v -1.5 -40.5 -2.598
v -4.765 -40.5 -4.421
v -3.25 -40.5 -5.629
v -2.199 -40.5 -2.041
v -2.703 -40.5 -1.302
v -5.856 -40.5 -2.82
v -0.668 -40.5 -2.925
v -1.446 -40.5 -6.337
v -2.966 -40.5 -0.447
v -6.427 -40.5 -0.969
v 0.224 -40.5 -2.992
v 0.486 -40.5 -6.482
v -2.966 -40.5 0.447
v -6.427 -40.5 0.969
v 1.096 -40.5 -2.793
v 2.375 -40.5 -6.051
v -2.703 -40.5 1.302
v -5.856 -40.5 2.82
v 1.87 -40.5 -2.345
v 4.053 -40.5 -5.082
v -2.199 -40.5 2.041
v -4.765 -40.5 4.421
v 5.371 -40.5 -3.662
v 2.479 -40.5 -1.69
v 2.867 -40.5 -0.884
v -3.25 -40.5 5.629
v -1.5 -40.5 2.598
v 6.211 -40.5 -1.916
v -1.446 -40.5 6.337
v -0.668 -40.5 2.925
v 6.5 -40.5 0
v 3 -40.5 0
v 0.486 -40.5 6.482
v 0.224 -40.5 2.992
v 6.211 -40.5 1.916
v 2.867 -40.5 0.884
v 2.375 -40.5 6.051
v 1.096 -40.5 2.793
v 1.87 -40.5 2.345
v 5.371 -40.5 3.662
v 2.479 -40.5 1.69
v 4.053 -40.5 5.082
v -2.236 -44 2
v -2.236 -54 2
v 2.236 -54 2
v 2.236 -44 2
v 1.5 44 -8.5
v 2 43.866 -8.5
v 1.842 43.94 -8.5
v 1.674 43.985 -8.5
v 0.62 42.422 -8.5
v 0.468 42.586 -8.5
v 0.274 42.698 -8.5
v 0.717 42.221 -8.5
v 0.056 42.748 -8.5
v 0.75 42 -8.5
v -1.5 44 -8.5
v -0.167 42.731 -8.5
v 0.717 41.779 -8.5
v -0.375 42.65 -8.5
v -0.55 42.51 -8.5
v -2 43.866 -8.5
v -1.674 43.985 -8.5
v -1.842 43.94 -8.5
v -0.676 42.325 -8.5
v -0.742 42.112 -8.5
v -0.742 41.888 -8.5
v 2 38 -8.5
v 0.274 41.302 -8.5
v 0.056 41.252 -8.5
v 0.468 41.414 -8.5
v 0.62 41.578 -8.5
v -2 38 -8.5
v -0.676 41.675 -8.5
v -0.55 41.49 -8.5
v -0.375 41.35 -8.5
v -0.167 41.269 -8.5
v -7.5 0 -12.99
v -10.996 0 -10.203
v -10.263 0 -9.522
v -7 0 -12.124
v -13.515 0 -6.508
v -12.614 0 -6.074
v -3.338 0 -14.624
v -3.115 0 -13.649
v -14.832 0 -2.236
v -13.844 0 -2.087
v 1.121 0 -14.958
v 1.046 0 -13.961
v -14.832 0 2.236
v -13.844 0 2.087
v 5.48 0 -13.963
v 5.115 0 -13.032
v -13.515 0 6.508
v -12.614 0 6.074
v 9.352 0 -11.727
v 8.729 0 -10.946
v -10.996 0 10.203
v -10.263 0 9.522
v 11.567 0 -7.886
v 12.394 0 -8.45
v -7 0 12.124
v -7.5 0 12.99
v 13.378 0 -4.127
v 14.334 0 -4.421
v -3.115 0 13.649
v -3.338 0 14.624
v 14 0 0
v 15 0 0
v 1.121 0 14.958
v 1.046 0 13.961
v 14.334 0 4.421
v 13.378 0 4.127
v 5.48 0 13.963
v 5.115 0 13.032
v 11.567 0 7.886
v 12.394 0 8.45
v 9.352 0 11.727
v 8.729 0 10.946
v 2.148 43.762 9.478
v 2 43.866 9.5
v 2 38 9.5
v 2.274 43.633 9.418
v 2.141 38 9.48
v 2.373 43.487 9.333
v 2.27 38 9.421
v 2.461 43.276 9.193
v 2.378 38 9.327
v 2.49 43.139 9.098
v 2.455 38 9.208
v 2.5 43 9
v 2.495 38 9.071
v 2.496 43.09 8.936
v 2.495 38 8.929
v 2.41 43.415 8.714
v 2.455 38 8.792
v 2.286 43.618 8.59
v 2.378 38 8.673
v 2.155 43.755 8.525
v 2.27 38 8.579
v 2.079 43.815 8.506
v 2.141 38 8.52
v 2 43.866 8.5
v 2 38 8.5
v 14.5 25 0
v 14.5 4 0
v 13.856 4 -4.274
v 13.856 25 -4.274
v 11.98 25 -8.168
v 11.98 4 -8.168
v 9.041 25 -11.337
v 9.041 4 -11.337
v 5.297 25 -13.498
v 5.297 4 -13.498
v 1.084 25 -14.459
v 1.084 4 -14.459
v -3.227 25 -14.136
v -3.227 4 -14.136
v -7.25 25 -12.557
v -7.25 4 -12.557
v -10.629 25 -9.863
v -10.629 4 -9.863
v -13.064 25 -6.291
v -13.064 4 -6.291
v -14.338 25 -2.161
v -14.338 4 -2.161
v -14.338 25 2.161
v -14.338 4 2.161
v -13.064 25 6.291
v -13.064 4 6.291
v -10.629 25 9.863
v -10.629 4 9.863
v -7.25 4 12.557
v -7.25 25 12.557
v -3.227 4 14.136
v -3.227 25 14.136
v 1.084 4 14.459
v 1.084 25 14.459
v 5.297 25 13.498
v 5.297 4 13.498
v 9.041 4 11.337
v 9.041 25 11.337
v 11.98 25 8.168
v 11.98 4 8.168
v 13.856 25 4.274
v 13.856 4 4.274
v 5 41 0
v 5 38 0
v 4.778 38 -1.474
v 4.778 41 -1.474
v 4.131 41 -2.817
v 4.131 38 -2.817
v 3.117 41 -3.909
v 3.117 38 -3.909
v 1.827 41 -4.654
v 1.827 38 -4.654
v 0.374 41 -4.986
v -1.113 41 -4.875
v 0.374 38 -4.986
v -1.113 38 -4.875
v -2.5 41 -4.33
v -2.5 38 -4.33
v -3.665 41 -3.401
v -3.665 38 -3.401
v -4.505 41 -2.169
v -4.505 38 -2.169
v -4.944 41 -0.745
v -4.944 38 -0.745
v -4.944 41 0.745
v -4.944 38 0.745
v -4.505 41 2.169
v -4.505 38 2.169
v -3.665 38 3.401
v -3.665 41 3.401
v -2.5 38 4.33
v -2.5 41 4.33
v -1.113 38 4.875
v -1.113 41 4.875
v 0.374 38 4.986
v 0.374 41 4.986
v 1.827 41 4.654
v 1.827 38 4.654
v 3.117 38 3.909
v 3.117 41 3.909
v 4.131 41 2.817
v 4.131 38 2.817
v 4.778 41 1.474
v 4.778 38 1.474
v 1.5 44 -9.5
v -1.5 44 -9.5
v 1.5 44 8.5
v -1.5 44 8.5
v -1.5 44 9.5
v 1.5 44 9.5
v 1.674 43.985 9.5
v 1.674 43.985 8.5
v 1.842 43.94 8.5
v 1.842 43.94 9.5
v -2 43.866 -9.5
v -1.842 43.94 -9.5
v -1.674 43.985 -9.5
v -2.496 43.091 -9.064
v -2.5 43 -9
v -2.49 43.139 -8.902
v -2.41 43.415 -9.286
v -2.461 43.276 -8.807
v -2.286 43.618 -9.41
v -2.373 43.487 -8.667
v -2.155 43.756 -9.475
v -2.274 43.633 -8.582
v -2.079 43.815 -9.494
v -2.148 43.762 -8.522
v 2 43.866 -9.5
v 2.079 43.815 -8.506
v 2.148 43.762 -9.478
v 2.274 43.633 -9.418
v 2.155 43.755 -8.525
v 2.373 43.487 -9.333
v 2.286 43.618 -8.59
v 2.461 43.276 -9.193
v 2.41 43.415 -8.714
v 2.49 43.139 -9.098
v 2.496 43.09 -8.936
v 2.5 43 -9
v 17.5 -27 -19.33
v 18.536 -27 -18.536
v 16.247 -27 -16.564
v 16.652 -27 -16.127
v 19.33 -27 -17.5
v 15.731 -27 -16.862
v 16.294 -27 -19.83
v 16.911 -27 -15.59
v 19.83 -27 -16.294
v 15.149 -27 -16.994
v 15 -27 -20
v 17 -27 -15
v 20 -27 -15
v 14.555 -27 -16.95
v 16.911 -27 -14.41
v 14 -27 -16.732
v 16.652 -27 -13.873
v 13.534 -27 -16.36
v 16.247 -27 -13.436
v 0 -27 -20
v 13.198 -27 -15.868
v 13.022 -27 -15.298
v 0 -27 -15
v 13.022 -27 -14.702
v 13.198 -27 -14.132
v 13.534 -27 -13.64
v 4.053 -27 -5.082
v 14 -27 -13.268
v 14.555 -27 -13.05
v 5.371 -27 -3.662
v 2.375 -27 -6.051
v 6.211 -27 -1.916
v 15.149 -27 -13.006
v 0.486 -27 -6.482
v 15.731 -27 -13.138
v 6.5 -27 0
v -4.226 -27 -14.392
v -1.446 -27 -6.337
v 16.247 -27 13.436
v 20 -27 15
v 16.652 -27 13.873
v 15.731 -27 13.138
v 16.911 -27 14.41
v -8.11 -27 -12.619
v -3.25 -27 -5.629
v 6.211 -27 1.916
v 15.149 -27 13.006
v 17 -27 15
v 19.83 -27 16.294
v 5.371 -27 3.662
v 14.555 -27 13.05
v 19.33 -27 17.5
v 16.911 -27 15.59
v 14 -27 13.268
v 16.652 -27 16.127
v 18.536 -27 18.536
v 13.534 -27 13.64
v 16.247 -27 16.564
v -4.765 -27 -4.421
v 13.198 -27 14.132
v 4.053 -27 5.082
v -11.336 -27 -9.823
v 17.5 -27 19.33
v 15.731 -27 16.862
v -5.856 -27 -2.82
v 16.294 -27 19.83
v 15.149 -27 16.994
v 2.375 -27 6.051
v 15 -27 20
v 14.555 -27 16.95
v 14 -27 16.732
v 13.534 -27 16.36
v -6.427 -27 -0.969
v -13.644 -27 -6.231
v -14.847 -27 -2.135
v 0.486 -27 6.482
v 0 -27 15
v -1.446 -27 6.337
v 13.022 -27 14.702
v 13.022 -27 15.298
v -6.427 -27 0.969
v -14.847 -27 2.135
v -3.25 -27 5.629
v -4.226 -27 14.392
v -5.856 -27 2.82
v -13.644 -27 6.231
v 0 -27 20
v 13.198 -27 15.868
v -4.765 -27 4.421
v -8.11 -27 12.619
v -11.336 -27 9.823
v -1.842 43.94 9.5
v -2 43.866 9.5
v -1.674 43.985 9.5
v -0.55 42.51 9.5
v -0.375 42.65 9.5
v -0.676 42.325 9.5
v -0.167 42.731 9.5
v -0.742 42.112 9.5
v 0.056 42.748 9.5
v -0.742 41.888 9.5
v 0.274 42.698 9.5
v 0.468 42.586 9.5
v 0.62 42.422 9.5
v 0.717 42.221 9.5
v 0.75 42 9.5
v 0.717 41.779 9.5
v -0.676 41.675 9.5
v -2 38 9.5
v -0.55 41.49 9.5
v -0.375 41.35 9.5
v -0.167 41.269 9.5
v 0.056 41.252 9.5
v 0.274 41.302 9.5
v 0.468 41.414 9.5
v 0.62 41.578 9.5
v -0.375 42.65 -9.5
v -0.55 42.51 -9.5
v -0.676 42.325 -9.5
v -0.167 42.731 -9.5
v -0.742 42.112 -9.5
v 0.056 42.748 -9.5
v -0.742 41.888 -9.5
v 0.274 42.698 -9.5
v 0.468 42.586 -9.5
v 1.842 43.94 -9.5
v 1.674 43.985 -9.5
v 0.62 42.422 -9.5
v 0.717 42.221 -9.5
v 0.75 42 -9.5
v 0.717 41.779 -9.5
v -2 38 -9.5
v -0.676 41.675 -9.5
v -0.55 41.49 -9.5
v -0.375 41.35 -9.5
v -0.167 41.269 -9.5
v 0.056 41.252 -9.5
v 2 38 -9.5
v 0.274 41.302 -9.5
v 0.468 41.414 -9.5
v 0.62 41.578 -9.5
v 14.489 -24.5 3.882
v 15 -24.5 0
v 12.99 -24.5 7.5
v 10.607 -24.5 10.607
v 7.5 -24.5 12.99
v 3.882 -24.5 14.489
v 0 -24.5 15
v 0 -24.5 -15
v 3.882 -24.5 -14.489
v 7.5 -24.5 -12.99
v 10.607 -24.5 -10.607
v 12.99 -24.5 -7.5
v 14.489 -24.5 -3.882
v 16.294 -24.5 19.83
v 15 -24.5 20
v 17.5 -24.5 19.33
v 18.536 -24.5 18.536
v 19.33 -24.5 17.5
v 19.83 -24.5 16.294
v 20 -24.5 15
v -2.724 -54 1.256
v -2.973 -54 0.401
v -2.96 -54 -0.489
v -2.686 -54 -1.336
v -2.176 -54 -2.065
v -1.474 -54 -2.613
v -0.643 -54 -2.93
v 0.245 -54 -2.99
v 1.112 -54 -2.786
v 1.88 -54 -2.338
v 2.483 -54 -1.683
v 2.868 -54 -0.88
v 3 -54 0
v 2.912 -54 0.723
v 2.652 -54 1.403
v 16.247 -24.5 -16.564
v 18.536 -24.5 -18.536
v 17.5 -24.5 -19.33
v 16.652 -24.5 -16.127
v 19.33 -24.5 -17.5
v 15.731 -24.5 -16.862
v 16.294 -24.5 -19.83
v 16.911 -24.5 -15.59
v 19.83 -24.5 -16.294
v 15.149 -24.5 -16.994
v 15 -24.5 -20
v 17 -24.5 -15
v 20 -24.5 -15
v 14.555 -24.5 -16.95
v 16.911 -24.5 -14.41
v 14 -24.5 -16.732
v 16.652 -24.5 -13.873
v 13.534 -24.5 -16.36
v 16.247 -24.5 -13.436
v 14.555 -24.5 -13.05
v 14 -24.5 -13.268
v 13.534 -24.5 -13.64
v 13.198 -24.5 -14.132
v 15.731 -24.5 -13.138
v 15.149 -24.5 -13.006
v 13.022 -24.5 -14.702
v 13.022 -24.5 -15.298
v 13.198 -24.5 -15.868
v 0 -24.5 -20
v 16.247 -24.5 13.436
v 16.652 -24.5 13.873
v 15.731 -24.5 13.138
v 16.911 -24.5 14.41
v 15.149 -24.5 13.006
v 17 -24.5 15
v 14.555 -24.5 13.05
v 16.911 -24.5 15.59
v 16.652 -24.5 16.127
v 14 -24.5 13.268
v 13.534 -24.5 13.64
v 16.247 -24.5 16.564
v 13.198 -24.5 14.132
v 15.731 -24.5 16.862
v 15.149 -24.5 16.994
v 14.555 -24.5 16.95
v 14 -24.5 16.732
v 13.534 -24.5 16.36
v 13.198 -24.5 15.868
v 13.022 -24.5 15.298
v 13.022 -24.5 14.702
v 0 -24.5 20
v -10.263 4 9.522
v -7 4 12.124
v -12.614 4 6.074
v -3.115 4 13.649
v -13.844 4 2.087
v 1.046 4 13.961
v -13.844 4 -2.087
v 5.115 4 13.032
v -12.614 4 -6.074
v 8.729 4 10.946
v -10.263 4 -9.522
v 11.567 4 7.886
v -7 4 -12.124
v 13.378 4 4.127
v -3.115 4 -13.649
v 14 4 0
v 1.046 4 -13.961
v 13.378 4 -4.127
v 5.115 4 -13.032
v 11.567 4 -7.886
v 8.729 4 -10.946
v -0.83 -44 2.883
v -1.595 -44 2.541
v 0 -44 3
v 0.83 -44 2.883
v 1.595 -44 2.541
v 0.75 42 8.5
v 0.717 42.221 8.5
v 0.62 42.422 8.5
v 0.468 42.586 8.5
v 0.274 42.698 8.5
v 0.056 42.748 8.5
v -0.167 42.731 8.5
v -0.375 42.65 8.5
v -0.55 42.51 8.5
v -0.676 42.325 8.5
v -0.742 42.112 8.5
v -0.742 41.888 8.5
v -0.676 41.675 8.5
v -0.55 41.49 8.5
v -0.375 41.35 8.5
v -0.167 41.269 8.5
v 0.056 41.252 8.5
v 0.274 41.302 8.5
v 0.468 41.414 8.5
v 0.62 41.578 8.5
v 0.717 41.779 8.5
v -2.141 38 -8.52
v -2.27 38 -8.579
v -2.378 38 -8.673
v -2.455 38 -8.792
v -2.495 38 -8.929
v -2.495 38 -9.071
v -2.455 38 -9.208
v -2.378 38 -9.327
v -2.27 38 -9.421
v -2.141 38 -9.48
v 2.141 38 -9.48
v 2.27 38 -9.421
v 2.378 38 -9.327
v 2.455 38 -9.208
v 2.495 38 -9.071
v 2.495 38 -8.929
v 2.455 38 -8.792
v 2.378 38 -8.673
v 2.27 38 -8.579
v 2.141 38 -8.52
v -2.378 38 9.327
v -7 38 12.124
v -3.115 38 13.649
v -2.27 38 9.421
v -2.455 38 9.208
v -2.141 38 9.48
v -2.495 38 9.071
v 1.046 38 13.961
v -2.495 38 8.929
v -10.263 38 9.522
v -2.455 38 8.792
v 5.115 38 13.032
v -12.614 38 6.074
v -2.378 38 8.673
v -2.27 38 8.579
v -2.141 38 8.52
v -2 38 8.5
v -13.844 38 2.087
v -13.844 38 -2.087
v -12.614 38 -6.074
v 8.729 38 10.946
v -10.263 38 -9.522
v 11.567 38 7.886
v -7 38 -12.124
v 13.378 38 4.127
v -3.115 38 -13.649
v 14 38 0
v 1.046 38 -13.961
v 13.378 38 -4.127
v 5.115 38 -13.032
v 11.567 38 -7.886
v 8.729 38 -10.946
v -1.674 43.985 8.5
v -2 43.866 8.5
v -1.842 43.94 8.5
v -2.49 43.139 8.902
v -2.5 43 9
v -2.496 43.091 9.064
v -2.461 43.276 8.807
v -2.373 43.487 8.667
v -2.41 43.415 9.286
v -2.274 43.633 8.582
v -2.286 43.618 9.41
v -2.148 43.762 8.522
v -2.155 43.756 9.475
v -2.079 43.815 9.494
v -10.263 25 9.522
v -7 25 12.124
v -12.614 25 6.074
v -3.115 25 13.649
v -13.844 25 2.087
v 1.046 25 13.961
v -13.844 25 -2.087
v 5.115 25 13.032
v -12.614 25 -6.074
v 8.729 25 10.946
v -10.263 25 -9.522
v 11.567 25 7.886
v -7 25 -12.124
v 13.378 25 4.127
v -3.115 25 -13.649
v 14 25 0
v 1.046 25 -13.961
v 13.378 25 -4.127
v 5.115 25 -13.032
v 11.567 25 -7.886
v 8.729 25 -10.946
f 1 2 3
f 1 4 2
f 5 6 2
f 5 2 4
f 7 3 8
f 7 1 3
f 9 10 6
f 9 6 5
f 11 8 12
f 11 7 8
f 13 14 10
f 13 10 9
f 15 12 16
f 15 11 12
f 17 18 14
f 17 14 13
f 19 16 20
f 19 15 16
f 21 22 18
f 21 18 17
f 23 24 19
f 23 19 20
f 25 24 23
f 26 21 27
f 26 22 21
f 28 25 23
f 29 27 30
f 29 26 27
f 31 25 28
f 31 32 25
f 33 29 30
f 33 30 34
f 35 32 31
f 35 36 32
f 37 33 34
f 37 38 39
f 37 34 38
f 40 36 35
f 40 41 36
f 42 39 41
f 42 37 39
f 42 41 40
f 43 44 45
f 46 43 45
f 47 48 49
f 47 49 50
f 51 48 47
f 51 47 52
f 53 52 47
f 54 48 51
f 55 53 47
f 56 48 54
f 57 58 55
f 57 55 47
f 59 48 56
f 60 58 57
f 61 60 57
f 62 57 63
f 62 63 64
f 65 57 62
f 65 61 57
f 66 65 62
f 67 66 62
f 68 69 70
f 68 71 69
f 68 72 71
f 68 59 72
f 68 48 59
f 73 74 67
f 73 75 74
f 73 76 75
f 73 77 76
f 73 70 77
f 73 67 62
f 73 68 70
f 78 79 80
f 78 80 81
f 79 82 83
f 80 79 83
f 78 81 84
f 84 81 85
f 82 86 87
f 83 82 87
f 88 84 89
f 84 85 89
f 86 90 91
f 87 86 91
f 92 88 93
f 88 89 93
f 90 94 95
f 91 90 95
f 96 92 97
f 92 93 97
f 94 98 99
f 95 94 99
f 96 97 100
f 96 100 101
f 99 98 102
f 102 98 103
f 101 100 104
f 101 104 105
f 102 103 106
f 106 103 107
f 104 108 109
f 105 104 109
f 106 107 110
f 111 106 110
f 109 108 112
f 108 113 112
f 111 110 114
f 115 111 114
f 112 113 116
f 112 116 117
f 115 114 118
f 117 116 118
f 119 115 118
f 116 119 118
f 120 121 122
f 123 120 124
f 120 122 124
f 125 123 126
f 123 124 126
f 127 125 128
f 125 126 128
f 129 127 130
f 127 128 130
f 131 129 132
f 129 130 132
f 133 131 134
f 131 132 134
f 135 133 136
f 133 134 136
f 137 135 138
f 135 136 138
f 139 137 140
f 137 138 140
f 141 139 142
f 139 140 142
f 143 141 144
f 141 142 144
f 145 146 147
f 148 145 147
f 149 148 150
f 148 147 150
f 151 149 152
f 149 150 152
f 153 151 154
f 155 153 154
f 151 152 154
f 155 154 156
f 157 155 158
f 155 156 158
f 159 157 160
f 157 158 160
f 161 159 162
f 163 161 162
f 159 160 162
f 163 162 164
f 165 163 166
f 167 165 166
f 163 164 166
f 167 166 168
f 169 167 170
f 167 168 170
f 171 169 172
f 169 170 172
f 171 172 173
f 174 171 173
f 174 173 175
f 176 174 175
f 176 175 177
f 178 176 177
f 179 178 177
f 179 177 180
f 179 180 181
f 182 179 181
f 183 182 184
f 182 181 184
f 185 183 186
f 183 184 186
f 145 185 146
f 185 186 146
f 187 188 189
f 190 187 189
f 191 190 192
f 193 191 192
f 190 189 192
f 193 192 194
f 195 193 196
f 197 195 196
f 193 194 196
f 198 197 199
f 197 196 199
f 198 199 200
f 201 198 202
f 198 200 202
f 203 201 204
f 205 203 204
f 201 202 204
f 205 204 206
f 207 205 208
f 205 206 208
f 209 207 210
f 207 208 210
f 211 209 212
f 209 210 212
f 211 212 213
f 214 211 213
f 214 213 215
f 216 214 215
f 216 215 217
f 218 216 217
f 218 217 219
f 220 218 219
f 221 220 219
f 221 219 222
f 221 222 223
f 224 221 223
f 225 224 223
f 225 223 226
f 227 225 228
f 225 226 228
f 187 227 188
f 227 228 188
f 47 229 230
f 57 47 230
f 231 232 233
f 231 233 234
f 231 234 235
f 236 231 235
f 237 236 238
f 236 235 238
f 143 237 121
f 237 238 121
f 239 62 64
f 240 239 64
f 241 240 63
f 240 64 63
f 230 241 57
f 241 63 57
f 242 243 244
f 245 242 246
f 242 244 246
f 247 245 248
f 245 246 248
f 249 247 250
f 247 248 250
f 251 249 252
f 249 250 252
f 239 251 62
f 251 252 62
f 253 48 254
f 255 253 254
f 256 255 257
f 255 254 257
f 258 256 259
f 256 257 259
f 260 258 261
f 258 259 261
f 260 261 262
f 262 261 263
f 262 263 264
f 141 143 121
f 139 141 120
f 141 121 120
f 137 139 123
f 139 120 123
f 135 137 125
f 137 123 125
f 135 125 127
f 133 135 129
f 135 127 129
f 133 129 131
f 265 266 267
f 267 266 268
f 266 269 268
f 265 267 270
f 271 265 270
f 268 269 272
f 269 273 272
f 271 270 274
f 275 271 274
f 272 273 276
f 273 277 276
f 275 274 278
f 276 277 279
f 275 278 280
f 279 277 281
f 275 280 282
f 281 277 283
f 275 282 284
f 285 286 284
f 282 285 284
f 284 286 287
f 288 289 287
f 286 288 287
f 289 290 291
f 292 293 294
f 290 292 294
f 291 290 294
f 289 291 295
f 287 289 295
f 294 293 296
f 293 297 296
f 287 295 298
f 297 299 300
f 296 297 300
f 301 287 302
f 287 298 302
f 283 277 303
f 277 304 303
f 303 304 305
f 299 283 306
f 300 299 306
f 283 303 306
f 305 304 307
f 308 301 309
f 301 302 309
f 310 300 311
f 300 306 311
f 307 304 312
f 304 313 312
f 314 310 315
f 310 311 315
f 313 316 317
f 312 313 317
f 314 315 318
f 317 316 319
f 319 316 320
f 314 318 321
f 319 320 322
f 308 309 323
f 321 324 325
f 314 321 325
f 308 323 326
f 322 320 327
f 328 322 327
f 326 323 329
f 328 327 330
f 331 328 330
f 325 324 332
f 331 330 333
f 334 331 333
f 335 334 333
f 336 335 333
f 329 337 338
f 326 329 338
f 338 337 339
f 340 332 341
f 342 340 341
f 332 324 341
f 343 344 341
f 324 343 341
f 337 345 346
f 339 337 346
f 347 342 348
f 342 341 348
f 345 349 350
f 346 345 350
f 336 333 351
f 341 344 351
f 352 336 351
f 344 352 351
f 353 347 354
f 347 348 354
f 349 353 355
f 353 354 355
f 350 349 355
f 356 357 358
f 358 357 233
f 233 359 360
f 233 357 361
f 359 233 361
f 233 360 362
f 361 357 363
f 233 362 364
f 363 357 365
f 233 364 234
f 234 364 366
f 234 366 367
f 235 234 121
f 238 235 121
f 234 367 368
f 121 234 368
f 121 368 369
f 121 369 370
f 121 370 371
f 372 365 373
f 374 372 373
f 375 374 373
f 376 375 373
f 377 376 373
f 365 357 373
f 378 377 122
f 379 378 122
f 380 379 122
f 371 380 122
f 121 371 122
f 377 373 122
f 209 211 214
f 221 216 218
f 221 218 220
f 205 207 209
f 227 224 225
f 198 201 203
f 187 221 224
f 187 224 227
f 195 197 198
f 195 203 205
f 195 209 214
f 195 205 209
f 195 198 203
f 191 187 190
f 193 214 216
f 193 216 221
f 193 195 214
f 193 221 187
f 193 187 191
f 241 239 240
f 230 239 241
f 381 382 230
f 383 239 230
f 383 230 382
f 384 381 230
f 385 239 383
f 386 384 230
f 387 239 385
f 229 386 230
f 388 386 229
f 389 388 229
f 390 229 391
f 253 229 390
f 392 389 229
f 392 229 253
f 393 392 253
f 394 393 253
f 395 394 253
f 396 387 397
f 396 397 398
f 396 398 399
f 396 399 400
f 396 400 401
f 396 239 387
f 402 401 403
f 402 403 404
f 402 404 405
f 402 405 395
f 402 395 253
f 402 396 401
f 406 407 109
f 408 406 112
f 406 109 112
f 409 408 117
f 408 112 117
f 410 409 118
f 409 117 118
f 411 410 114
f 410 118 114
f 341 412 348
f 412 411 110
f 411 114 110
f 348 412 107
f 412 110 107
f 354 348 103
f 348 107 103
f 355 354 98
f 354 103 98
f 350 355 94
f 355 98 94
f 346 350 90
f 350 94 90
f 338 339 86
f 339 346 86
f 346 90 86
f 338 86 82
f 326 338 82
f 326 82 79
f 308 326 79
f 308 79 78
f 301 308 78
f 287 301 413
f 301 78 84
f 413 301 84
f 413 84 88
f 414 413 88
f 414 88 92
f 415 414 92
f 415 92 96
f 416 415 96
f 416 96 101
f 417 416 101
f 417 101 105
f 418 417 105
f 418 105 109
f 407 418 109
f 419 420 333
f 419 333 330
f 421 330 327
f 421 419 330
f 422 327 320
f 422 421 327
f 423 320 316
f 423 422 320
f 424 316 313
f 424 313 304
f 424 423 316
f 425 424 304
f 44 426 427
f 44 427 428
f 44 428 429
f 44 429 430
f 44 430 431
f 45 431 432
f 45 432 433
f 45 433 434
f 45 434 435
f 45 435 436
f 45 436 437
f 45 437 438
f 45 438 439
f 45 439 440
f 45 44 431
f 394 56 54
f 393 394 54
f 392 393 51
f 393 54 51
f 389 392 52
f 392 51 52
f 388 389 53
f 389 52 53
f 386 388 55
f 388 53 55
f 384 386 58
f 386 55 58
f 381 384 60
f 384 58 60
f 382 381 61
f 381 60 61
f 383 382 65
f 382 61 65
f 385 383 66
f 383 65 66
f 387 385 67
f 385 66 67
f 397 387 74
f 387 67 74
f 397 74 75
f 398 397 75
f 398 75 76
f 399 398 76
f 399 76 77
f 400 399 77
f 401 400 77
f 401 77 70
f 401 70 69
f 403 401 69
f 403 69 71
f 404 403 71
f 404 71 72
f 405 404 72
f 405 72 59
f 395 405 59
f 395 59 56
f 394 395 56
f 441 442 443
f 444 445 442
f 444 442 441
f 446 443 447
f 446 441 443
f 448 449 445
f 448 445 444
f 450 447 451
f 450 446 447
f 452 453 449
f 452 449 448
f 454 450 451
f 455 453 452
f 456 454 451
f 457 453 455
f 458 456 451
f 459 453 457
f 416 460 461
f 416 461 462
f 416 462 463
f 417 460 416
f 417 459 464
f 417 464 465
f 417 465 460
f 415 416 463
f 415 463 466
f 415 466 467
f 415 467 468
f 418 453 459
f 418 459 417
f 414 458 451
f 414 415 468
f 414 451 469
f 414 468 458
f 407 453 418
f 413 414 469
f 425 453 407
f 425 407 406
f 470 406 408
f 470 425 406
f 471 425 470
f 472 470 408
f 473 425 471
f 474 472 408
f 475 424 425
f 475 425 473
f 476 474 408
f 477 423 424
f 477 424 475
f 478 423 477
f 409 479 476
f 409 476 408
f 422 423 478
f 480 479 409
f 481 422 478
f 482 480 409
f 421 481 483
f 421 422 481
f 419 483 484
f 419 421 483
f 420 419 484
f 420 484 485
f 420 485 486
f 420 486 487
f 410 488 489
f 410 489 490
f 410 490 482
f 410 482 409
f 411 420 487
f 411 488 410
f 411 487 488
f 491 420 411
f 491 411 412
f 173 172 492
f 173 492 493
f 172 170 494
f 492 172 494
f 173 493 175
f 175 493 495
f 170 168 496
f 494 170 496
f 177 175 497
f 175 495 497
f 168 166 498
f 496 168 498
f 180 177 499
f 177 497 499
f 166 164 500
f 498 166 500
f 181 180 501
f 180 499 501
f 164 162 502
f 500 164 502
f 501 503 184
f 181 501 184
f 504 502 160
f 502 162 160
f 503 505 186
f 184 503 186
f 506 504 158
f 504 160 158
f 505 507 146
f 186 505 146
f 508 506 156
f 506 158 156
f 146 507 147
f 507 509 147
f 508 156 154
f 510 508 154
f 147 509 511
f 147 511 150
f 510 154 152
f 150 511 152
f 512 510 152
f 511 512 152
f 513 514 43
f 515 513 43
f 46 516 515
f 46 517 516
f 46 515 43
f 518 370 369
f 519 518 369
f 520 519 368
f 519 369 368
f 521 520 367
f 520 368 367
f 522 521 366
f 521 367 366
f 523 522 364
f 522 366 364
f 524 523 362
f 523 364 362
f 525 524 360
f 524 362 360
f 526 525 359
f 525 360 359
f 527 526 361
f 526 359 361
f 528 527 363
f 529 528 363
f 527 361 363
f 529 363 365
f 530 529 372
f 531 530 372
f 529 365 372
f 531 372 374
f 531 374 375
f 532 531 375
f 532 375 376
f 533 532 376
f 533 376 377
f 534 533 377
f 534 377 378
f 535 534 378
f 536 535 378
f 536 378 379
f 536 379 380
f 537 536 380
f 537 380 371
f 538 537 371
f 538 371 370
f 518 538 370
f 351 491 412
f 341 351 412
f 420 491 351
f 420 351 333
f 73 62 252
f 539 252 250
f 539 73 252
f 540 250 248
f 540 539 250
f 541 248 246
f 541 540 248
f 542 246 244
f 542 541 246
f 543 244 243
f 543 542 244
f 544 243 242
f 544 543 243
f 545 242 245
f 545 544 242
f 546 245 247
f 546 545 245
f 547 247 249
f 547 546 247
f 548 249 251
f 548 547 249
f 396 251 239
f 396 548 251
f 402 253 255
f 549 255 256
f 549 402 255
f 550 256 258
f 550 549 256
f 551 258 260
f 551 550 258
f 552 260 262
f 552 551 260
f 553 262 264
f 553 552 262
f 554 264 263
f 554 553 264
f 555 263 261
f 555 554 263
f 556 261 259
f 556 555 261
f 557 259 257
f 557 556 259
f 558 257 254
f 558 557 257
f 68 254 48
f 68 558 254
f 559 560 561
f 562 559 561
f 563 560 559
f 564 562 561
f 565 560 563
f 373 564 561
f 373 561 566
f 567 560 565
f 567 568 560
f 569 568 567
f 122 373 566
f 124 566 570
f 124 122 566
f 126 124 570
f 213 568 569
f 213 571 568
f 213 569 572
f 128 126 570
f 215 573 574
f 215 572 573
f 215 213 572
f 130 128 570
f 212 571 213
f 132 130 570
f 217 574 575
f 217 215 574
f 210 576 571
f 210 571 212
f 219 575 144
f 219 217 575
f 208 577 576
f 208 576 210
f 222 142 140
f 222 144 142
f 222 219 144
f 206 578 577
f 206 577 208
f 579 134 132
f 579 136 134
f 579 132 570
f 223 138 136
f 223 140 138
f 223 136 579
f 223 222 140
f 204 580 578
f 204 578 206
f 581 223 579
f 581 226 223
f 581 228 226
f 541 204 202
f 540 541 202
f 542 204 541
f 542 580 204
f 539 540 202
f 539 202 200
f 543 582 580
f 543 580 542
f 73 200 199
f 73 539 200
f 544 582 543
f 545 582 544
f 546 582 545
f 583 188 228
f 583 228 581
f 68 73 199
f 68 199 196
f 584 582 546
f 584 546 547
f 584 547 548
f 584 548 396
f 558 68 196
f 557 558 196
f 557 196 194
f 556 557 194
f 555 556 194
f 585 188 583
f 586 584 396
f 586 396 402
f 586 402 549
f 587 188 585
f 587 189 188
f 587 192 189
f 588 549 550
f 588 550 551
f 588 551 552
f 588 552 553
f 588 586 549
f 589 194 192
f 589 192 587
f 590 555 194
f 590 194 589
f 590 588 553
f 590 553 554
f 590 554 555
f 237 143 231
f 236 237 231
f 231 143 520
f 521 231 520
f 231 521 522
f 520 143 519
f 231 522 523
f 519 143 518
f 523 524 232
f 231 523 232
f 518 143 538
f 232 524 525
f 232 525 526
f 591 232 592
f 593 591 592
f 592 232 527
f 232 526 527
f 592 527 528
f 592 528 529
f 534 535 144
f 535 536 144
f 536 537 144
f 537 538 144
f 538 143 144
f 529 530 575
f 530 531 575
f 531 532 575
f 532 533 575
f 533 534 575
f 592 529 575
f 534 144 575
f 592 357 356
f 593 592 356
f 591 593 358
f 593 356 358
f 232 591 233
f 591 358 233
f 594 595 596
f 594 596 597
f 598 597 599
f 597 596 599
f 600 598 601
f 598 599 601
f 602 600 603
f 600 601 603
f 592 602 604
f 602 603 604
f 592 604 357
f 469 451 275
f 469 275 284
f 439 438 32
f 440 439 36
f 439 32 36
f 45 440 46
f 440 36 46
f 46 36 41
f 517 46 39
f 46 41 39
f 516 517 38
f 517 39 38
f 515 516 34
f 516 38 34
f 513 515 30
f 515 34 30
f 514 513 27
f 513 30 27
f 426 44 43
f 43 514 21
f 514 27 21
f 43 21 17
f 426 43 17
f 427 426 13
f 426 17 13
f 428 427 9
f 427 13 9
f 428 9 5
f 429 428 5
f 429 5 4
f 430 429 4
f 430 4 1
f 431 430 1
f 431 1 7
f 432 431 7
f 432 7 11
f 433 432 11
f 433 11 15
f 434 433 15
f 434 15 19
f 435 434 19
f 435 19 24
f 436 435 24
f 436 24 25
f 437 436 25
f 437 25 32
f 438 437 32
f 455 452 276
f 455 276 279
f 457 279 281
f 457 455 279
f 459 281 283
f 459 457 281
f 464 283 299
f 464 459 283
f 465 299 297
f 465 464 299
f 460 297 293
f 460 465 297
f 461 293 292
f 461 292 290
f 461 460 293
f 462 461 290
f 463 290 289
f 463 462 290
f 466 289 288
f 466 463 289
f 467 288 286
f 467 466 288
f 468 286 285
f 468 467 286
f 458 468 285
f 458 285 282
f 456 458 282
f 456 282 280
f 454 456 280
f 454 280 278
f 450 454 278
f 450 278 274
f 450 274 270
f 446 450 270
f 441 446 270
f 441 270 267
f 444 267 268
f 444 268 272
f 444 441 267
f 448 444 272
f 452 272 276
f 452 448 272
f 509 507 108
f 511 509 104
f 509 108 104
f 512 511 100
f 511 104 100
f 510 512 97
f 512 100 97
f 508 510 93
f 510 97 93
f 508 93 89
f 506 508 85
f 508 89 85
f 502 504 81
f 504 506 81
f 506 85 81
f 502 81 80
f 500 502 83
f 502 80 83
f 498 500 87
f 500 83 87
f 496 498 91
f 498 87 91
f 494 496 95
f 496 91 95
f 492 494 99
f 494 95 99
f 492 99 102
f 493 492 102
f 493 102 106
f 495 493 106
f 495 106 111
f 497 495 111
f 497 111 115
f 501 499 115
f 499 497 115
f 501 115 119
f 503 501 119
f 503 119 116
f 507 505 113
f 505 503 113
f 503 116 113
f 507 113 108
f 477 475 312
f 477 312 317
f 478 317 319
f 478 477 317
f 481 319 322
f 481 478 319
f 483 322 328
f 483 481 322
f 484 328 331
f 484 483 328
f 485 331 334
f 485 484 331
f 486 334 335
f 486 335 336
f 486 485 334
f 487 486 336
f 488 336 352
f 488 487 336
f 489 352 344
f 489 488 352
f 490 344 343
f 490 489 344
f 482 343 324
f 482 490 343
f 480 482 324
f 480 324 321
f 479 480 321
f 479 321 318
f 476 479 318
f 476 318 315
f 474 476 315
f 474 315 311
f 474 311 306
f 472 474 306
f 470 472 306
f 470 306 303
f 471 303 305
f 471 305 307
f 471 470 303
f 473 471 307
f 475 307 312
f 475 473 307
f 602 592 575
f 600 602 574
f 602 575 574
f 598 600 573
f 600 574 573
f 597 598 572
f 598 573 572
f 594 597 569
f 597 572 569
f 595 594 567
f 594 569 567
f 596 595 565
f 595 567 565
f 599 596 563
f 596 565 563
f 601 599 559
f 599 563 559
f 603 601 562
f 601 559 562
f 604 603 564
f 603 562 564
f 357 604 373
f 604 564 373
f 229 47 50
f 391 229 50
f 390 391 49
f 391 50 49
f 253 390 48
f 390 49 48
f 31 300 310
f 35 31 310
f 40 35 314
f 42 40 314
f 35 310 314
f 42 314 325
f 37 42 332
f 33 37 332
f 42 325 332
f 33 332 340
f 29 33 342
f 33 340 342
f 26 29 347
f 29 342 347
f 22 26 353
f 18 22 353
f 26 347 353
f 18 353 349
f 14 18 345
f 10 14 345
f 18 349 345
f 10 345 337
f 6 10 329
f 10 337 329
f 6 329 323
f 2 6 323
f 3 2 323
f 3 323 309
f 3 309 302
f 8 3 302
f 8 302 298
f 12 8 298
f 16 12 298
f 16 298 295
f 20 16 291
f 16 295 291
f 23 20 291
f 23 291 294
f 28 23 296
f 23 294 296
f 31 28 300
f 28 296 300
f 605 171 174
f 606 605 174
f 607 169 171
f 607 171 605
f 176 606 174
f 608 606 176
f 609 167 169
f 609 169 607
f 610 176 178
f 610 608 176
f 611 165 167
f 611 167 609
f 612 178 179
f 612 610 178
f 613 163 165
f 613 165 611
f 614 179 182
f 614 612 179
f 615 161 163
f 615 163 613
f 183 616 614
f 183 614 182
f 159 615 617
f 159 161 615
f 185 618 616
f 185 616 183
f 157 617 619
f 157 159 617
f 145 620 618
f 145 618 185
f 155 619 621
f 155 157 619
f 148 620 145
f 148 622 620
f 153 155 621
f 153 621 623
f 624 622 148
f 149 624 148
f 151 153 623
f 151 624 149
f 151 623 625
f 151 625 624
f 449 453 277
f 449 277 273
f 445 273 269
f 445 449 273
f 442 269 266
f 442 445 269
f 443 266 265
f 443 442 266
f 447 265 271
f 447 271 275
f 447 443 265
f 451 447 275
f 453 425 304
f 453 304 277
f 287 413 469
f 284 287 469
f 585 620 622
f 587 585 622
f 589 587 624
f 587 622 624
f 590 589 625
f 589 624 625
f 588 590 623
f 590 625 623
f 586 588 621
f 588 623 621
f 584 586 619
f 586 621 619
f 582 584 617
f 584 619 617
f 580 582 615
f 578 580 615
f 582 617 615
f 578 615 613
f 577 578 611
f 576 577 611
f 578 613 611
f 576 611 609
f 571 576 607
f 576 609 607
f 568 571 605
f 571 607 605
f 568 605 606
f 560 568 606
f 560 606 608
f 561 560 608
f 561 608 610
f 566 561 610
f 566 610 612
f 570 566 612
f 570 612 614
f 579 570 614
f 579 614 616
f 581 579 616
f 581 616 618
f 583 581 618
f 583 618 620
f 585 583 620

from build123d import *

# Parameters (mm, degrees)
CROQUIS1_R               = 14
MOTOR_DEPTH              = 38
CROQUIS2_R               = 5
SALIENTE_POSTERIOR_DEPTH = 3
BORNES_DEPTH             = 6
CROQUIS4_R               = 0.75
AGUJERO_BORNES_DEPTH     = 24.5
CROQUIS5_R               = 15
CAJA_REDUCTORA_DEPTH     = 24.5
CROQUIS6_R               = 2
BRIDA_DEPTH              = 2.5
CROQUIS7_R               = 6.5
SALIENTE_EJE_DEPTH       = 13.5
CROQUIS8_R               = 3
EJE_DEPTH                = 13.5
CORTE_PLANO_EJE_DEPTH    = 10
CROQUIS10_R              = 2
CORTE_BRIDA_DEPTH        = 10
SALIENTE_EXTRUIR1_START  = 4
CROQUIS11_R              = 14.5
SALIENTE_EXTRUIR1_DEPTH  = 21


with BuildPart() as part:
    # Croquis1 → Motor (new body)
    with BuildSketch(Plane(origin=(0, 0, 0), x_dir=(1, 0, 0), z_dir=(0, 1, 0))):
        Circle(CROQUIS1_R)
    extrude(amount=MOTOR_DEPTH)

    # Croquis2 → Saliente posterior (add)
    with BuildSketch(Plane(origin=(0, 38, 0), x_dir=(1, 0, 0), z_dir=(0, 1, 0))):
        Circle(CROQUIS2_R)
    extrude(amount=SALIENTE_POSTERIOR_DEPTH)

    # Croquis3 → Bornes (add)
    with BuildSketch(Plane(origin=(0, 38, 0), x_dir=(1, 0, 0), z_dir=(0, 1, 0))):
        with BuildLine():
            Line((-2, 9.5), (2, 9.5))
            ThreePointArc((2, 9.5), (2.5, 9), (2, 8.5))
            Line((2, 8.5), (-2, 8.5))
            ThreePointArc((-2, 8.5), (-2.5, 9), (-2, 9.5))
        make_face()
        with BuildLine():
            Line((-2, -9.5), (2, -9.5))
            ThreePointArc((2, -9.5), (2.5, -9), (2, -8.5))
            Line((2, -8.5), (-2, -8.5))
            ThreePointArc((-2, -8.5), (-2.5, -9), (-2, -9.5))
        make_face()
    extrude(amount=BORNES_DEPTH)

    # Croquis4 → Agujero Bornes (cut, through all)
    with BuildSketch(Plane.XY.offset(9.5)):
        with Locations((0, 42)):
            Circle(CROQUIS4_R)
        with BuildLine():
            ThreePointArc((2, 43.866025404), (2.366025404, 43.5), (2.5, 43))
            Line((2.5, 43), (2.5, 44))
            Line((2.5, 44), (2, 44))
            Line((2, 44), (2, 43.866025404))
        make_face()
        with BuildLine():
            ThreePointArc((1.5, 44), (1.758819045, 43.965925826), (2, 43.866025404))
            Line((2, 43.866025404), (2, 44))
            Line((2, 44), (1.5, 44))
        make_face()
        with BuildLine():
            Line((-2, 43.866025404), (-2, 44))
            Line((-2, 44), (-2.5, 44))
            Line((-2.5, 44), (-2.5, 43))
            ThreePointArc((-2.5, 43), (-2.366025404, 43.5), (-2, 43.866025404))
        make_face()
        with BuildLine():
            ThreePointArc((-2, 43.866025404), (-1.758819045, 43.965925826), (-1.5, 44))
            Line((-1.5, 44), (-2, 44))
            Line((-2, 44), (-2, 43.866025404))
        make_face()
    extrude(amount=-AGUJERO_BORNES_DEPTH, mode=Mode.SUBTRACT)

    # Croquis5 → Caja reductora (add)
    with BuildSketch(Plane.XZ):
        Circle(CROQUIS5_R)
    extrude(amount=CAJA_REDUCTORA_DEPTH)

    # Croquis6 → Brida (add)
    with BuildSketch(Plane.XZ.offset(24.5)):
        with BuildLine():
            Line((-15, 20), (15, 20))
            ThreePointArc((15, 20), (18.535533906, 18.535533906), (20, 15))
            Line((20, 15), (20, -15))
            ThreePointArc((20, -15), (18.535533906, -18.535533906), (15, -20))
            Line((15, -20), (-15, -20))
            ThreePointArc((-15, -20), (-18.535533906, -18.535533906), (-20, -15))
            Line((-20, -15), (-20, 15))
            ThreePointArc((-20, 15), (-18.535533906, 18.535533906), (-15, 20))
        make_face()
        with Locations((-15, 15)):
            Circle(CROQUIS6_R, mode=Mode.SUBTRACT)
        with Locations((15, 15)):
            Circle(CROQUIS6_R, mode=Mode.SUBTRACT)
        with Locations((15, -15)):
            Circle(CROQUIS6_R, mode=Mode.SUBTRACT)
        with Locations((-15, -15)):
            Circle(CROQUIS6_R, mode=Mode.SUBTRACT)
    extrude(amount=BRIDA_DEPTH)

    # Croquis7 → Saliente eje (add)
    with BuildSketch(Plane.XZ.offset(27)):
        Circle(CROQUIS7_R)
    extrude(amount=SALIENTE_EJE_DEPTH)

    # Croquis8 → Eje (add)
    with BuildSketch(Plane.XZ.offset(40.5)):
        Circle(CROQUIS8_R)
    extrude(amount=EJE_DEPTH)

    # Croquis9 → Corte Plano eje (cut)
    with BuildSketch(Plane.XZ.offset(54)):
        Polygon((-74.796206056, 2), (-2.236067977, 2), (2.236067977, 2), (74.796206056, 2), (74.796206056, 147.120276157), (-74.796206056, 147.120276157), align=None)
    extrude(amount=-CORTE_PLANO_EJE_DEPTH, mode=Mode.SUBTRACT)

    # Croquis10 → Corte Brida (cut)
    with BuildSketch(Plane(origin=(0, -24.5, 0), x_dir=(1, 0, 0), z_dir=(0, 1, 0))):
        with BuildLine():
            Line((0, 15), (0, 20))
            Line((0, 20), (-15, 20))
            ThreePointArc((-15, 20), (-18.535533906, 18.535533906), (-20, 15))
            Line((-20, 15), (-20, -15))
            ThreePointArc((-20, -15), (-18.535533906, -18.535533906), (-15, -20))
            Line((-15, -20), (0, -20))
            Line((0, -20), (0, -15))
            ThreePointArc((0, -15), (-15, 0), (0, 15))
        make_face()
        with Locations((-15, -15)):
            Circle(CROQUIS10_R, mode=Mode.SUBTRACT)
        with Locations((-15, 15)):
            Circle(CROQUIS10_R, mode=Mode.SUBTRACT)
    extrude(amount=-CORTE_BRIDA_DEPTH, mode=Mode.SUBTRACT)

    # Croquis11 → Saliente-Extruir1 (add)
    with BuildSketch(Plane(origin=(0, 0, 0), x_dir=(1, 0, 0), z_dir=(0, 1, 0)).offset(SALIENTE_EXTRUIR1_START)):
        Circle(CROQUIS11_R)
    extrude(amount=SALIENTE_EXTRUIR1_DEPTH)


solid = part.part
